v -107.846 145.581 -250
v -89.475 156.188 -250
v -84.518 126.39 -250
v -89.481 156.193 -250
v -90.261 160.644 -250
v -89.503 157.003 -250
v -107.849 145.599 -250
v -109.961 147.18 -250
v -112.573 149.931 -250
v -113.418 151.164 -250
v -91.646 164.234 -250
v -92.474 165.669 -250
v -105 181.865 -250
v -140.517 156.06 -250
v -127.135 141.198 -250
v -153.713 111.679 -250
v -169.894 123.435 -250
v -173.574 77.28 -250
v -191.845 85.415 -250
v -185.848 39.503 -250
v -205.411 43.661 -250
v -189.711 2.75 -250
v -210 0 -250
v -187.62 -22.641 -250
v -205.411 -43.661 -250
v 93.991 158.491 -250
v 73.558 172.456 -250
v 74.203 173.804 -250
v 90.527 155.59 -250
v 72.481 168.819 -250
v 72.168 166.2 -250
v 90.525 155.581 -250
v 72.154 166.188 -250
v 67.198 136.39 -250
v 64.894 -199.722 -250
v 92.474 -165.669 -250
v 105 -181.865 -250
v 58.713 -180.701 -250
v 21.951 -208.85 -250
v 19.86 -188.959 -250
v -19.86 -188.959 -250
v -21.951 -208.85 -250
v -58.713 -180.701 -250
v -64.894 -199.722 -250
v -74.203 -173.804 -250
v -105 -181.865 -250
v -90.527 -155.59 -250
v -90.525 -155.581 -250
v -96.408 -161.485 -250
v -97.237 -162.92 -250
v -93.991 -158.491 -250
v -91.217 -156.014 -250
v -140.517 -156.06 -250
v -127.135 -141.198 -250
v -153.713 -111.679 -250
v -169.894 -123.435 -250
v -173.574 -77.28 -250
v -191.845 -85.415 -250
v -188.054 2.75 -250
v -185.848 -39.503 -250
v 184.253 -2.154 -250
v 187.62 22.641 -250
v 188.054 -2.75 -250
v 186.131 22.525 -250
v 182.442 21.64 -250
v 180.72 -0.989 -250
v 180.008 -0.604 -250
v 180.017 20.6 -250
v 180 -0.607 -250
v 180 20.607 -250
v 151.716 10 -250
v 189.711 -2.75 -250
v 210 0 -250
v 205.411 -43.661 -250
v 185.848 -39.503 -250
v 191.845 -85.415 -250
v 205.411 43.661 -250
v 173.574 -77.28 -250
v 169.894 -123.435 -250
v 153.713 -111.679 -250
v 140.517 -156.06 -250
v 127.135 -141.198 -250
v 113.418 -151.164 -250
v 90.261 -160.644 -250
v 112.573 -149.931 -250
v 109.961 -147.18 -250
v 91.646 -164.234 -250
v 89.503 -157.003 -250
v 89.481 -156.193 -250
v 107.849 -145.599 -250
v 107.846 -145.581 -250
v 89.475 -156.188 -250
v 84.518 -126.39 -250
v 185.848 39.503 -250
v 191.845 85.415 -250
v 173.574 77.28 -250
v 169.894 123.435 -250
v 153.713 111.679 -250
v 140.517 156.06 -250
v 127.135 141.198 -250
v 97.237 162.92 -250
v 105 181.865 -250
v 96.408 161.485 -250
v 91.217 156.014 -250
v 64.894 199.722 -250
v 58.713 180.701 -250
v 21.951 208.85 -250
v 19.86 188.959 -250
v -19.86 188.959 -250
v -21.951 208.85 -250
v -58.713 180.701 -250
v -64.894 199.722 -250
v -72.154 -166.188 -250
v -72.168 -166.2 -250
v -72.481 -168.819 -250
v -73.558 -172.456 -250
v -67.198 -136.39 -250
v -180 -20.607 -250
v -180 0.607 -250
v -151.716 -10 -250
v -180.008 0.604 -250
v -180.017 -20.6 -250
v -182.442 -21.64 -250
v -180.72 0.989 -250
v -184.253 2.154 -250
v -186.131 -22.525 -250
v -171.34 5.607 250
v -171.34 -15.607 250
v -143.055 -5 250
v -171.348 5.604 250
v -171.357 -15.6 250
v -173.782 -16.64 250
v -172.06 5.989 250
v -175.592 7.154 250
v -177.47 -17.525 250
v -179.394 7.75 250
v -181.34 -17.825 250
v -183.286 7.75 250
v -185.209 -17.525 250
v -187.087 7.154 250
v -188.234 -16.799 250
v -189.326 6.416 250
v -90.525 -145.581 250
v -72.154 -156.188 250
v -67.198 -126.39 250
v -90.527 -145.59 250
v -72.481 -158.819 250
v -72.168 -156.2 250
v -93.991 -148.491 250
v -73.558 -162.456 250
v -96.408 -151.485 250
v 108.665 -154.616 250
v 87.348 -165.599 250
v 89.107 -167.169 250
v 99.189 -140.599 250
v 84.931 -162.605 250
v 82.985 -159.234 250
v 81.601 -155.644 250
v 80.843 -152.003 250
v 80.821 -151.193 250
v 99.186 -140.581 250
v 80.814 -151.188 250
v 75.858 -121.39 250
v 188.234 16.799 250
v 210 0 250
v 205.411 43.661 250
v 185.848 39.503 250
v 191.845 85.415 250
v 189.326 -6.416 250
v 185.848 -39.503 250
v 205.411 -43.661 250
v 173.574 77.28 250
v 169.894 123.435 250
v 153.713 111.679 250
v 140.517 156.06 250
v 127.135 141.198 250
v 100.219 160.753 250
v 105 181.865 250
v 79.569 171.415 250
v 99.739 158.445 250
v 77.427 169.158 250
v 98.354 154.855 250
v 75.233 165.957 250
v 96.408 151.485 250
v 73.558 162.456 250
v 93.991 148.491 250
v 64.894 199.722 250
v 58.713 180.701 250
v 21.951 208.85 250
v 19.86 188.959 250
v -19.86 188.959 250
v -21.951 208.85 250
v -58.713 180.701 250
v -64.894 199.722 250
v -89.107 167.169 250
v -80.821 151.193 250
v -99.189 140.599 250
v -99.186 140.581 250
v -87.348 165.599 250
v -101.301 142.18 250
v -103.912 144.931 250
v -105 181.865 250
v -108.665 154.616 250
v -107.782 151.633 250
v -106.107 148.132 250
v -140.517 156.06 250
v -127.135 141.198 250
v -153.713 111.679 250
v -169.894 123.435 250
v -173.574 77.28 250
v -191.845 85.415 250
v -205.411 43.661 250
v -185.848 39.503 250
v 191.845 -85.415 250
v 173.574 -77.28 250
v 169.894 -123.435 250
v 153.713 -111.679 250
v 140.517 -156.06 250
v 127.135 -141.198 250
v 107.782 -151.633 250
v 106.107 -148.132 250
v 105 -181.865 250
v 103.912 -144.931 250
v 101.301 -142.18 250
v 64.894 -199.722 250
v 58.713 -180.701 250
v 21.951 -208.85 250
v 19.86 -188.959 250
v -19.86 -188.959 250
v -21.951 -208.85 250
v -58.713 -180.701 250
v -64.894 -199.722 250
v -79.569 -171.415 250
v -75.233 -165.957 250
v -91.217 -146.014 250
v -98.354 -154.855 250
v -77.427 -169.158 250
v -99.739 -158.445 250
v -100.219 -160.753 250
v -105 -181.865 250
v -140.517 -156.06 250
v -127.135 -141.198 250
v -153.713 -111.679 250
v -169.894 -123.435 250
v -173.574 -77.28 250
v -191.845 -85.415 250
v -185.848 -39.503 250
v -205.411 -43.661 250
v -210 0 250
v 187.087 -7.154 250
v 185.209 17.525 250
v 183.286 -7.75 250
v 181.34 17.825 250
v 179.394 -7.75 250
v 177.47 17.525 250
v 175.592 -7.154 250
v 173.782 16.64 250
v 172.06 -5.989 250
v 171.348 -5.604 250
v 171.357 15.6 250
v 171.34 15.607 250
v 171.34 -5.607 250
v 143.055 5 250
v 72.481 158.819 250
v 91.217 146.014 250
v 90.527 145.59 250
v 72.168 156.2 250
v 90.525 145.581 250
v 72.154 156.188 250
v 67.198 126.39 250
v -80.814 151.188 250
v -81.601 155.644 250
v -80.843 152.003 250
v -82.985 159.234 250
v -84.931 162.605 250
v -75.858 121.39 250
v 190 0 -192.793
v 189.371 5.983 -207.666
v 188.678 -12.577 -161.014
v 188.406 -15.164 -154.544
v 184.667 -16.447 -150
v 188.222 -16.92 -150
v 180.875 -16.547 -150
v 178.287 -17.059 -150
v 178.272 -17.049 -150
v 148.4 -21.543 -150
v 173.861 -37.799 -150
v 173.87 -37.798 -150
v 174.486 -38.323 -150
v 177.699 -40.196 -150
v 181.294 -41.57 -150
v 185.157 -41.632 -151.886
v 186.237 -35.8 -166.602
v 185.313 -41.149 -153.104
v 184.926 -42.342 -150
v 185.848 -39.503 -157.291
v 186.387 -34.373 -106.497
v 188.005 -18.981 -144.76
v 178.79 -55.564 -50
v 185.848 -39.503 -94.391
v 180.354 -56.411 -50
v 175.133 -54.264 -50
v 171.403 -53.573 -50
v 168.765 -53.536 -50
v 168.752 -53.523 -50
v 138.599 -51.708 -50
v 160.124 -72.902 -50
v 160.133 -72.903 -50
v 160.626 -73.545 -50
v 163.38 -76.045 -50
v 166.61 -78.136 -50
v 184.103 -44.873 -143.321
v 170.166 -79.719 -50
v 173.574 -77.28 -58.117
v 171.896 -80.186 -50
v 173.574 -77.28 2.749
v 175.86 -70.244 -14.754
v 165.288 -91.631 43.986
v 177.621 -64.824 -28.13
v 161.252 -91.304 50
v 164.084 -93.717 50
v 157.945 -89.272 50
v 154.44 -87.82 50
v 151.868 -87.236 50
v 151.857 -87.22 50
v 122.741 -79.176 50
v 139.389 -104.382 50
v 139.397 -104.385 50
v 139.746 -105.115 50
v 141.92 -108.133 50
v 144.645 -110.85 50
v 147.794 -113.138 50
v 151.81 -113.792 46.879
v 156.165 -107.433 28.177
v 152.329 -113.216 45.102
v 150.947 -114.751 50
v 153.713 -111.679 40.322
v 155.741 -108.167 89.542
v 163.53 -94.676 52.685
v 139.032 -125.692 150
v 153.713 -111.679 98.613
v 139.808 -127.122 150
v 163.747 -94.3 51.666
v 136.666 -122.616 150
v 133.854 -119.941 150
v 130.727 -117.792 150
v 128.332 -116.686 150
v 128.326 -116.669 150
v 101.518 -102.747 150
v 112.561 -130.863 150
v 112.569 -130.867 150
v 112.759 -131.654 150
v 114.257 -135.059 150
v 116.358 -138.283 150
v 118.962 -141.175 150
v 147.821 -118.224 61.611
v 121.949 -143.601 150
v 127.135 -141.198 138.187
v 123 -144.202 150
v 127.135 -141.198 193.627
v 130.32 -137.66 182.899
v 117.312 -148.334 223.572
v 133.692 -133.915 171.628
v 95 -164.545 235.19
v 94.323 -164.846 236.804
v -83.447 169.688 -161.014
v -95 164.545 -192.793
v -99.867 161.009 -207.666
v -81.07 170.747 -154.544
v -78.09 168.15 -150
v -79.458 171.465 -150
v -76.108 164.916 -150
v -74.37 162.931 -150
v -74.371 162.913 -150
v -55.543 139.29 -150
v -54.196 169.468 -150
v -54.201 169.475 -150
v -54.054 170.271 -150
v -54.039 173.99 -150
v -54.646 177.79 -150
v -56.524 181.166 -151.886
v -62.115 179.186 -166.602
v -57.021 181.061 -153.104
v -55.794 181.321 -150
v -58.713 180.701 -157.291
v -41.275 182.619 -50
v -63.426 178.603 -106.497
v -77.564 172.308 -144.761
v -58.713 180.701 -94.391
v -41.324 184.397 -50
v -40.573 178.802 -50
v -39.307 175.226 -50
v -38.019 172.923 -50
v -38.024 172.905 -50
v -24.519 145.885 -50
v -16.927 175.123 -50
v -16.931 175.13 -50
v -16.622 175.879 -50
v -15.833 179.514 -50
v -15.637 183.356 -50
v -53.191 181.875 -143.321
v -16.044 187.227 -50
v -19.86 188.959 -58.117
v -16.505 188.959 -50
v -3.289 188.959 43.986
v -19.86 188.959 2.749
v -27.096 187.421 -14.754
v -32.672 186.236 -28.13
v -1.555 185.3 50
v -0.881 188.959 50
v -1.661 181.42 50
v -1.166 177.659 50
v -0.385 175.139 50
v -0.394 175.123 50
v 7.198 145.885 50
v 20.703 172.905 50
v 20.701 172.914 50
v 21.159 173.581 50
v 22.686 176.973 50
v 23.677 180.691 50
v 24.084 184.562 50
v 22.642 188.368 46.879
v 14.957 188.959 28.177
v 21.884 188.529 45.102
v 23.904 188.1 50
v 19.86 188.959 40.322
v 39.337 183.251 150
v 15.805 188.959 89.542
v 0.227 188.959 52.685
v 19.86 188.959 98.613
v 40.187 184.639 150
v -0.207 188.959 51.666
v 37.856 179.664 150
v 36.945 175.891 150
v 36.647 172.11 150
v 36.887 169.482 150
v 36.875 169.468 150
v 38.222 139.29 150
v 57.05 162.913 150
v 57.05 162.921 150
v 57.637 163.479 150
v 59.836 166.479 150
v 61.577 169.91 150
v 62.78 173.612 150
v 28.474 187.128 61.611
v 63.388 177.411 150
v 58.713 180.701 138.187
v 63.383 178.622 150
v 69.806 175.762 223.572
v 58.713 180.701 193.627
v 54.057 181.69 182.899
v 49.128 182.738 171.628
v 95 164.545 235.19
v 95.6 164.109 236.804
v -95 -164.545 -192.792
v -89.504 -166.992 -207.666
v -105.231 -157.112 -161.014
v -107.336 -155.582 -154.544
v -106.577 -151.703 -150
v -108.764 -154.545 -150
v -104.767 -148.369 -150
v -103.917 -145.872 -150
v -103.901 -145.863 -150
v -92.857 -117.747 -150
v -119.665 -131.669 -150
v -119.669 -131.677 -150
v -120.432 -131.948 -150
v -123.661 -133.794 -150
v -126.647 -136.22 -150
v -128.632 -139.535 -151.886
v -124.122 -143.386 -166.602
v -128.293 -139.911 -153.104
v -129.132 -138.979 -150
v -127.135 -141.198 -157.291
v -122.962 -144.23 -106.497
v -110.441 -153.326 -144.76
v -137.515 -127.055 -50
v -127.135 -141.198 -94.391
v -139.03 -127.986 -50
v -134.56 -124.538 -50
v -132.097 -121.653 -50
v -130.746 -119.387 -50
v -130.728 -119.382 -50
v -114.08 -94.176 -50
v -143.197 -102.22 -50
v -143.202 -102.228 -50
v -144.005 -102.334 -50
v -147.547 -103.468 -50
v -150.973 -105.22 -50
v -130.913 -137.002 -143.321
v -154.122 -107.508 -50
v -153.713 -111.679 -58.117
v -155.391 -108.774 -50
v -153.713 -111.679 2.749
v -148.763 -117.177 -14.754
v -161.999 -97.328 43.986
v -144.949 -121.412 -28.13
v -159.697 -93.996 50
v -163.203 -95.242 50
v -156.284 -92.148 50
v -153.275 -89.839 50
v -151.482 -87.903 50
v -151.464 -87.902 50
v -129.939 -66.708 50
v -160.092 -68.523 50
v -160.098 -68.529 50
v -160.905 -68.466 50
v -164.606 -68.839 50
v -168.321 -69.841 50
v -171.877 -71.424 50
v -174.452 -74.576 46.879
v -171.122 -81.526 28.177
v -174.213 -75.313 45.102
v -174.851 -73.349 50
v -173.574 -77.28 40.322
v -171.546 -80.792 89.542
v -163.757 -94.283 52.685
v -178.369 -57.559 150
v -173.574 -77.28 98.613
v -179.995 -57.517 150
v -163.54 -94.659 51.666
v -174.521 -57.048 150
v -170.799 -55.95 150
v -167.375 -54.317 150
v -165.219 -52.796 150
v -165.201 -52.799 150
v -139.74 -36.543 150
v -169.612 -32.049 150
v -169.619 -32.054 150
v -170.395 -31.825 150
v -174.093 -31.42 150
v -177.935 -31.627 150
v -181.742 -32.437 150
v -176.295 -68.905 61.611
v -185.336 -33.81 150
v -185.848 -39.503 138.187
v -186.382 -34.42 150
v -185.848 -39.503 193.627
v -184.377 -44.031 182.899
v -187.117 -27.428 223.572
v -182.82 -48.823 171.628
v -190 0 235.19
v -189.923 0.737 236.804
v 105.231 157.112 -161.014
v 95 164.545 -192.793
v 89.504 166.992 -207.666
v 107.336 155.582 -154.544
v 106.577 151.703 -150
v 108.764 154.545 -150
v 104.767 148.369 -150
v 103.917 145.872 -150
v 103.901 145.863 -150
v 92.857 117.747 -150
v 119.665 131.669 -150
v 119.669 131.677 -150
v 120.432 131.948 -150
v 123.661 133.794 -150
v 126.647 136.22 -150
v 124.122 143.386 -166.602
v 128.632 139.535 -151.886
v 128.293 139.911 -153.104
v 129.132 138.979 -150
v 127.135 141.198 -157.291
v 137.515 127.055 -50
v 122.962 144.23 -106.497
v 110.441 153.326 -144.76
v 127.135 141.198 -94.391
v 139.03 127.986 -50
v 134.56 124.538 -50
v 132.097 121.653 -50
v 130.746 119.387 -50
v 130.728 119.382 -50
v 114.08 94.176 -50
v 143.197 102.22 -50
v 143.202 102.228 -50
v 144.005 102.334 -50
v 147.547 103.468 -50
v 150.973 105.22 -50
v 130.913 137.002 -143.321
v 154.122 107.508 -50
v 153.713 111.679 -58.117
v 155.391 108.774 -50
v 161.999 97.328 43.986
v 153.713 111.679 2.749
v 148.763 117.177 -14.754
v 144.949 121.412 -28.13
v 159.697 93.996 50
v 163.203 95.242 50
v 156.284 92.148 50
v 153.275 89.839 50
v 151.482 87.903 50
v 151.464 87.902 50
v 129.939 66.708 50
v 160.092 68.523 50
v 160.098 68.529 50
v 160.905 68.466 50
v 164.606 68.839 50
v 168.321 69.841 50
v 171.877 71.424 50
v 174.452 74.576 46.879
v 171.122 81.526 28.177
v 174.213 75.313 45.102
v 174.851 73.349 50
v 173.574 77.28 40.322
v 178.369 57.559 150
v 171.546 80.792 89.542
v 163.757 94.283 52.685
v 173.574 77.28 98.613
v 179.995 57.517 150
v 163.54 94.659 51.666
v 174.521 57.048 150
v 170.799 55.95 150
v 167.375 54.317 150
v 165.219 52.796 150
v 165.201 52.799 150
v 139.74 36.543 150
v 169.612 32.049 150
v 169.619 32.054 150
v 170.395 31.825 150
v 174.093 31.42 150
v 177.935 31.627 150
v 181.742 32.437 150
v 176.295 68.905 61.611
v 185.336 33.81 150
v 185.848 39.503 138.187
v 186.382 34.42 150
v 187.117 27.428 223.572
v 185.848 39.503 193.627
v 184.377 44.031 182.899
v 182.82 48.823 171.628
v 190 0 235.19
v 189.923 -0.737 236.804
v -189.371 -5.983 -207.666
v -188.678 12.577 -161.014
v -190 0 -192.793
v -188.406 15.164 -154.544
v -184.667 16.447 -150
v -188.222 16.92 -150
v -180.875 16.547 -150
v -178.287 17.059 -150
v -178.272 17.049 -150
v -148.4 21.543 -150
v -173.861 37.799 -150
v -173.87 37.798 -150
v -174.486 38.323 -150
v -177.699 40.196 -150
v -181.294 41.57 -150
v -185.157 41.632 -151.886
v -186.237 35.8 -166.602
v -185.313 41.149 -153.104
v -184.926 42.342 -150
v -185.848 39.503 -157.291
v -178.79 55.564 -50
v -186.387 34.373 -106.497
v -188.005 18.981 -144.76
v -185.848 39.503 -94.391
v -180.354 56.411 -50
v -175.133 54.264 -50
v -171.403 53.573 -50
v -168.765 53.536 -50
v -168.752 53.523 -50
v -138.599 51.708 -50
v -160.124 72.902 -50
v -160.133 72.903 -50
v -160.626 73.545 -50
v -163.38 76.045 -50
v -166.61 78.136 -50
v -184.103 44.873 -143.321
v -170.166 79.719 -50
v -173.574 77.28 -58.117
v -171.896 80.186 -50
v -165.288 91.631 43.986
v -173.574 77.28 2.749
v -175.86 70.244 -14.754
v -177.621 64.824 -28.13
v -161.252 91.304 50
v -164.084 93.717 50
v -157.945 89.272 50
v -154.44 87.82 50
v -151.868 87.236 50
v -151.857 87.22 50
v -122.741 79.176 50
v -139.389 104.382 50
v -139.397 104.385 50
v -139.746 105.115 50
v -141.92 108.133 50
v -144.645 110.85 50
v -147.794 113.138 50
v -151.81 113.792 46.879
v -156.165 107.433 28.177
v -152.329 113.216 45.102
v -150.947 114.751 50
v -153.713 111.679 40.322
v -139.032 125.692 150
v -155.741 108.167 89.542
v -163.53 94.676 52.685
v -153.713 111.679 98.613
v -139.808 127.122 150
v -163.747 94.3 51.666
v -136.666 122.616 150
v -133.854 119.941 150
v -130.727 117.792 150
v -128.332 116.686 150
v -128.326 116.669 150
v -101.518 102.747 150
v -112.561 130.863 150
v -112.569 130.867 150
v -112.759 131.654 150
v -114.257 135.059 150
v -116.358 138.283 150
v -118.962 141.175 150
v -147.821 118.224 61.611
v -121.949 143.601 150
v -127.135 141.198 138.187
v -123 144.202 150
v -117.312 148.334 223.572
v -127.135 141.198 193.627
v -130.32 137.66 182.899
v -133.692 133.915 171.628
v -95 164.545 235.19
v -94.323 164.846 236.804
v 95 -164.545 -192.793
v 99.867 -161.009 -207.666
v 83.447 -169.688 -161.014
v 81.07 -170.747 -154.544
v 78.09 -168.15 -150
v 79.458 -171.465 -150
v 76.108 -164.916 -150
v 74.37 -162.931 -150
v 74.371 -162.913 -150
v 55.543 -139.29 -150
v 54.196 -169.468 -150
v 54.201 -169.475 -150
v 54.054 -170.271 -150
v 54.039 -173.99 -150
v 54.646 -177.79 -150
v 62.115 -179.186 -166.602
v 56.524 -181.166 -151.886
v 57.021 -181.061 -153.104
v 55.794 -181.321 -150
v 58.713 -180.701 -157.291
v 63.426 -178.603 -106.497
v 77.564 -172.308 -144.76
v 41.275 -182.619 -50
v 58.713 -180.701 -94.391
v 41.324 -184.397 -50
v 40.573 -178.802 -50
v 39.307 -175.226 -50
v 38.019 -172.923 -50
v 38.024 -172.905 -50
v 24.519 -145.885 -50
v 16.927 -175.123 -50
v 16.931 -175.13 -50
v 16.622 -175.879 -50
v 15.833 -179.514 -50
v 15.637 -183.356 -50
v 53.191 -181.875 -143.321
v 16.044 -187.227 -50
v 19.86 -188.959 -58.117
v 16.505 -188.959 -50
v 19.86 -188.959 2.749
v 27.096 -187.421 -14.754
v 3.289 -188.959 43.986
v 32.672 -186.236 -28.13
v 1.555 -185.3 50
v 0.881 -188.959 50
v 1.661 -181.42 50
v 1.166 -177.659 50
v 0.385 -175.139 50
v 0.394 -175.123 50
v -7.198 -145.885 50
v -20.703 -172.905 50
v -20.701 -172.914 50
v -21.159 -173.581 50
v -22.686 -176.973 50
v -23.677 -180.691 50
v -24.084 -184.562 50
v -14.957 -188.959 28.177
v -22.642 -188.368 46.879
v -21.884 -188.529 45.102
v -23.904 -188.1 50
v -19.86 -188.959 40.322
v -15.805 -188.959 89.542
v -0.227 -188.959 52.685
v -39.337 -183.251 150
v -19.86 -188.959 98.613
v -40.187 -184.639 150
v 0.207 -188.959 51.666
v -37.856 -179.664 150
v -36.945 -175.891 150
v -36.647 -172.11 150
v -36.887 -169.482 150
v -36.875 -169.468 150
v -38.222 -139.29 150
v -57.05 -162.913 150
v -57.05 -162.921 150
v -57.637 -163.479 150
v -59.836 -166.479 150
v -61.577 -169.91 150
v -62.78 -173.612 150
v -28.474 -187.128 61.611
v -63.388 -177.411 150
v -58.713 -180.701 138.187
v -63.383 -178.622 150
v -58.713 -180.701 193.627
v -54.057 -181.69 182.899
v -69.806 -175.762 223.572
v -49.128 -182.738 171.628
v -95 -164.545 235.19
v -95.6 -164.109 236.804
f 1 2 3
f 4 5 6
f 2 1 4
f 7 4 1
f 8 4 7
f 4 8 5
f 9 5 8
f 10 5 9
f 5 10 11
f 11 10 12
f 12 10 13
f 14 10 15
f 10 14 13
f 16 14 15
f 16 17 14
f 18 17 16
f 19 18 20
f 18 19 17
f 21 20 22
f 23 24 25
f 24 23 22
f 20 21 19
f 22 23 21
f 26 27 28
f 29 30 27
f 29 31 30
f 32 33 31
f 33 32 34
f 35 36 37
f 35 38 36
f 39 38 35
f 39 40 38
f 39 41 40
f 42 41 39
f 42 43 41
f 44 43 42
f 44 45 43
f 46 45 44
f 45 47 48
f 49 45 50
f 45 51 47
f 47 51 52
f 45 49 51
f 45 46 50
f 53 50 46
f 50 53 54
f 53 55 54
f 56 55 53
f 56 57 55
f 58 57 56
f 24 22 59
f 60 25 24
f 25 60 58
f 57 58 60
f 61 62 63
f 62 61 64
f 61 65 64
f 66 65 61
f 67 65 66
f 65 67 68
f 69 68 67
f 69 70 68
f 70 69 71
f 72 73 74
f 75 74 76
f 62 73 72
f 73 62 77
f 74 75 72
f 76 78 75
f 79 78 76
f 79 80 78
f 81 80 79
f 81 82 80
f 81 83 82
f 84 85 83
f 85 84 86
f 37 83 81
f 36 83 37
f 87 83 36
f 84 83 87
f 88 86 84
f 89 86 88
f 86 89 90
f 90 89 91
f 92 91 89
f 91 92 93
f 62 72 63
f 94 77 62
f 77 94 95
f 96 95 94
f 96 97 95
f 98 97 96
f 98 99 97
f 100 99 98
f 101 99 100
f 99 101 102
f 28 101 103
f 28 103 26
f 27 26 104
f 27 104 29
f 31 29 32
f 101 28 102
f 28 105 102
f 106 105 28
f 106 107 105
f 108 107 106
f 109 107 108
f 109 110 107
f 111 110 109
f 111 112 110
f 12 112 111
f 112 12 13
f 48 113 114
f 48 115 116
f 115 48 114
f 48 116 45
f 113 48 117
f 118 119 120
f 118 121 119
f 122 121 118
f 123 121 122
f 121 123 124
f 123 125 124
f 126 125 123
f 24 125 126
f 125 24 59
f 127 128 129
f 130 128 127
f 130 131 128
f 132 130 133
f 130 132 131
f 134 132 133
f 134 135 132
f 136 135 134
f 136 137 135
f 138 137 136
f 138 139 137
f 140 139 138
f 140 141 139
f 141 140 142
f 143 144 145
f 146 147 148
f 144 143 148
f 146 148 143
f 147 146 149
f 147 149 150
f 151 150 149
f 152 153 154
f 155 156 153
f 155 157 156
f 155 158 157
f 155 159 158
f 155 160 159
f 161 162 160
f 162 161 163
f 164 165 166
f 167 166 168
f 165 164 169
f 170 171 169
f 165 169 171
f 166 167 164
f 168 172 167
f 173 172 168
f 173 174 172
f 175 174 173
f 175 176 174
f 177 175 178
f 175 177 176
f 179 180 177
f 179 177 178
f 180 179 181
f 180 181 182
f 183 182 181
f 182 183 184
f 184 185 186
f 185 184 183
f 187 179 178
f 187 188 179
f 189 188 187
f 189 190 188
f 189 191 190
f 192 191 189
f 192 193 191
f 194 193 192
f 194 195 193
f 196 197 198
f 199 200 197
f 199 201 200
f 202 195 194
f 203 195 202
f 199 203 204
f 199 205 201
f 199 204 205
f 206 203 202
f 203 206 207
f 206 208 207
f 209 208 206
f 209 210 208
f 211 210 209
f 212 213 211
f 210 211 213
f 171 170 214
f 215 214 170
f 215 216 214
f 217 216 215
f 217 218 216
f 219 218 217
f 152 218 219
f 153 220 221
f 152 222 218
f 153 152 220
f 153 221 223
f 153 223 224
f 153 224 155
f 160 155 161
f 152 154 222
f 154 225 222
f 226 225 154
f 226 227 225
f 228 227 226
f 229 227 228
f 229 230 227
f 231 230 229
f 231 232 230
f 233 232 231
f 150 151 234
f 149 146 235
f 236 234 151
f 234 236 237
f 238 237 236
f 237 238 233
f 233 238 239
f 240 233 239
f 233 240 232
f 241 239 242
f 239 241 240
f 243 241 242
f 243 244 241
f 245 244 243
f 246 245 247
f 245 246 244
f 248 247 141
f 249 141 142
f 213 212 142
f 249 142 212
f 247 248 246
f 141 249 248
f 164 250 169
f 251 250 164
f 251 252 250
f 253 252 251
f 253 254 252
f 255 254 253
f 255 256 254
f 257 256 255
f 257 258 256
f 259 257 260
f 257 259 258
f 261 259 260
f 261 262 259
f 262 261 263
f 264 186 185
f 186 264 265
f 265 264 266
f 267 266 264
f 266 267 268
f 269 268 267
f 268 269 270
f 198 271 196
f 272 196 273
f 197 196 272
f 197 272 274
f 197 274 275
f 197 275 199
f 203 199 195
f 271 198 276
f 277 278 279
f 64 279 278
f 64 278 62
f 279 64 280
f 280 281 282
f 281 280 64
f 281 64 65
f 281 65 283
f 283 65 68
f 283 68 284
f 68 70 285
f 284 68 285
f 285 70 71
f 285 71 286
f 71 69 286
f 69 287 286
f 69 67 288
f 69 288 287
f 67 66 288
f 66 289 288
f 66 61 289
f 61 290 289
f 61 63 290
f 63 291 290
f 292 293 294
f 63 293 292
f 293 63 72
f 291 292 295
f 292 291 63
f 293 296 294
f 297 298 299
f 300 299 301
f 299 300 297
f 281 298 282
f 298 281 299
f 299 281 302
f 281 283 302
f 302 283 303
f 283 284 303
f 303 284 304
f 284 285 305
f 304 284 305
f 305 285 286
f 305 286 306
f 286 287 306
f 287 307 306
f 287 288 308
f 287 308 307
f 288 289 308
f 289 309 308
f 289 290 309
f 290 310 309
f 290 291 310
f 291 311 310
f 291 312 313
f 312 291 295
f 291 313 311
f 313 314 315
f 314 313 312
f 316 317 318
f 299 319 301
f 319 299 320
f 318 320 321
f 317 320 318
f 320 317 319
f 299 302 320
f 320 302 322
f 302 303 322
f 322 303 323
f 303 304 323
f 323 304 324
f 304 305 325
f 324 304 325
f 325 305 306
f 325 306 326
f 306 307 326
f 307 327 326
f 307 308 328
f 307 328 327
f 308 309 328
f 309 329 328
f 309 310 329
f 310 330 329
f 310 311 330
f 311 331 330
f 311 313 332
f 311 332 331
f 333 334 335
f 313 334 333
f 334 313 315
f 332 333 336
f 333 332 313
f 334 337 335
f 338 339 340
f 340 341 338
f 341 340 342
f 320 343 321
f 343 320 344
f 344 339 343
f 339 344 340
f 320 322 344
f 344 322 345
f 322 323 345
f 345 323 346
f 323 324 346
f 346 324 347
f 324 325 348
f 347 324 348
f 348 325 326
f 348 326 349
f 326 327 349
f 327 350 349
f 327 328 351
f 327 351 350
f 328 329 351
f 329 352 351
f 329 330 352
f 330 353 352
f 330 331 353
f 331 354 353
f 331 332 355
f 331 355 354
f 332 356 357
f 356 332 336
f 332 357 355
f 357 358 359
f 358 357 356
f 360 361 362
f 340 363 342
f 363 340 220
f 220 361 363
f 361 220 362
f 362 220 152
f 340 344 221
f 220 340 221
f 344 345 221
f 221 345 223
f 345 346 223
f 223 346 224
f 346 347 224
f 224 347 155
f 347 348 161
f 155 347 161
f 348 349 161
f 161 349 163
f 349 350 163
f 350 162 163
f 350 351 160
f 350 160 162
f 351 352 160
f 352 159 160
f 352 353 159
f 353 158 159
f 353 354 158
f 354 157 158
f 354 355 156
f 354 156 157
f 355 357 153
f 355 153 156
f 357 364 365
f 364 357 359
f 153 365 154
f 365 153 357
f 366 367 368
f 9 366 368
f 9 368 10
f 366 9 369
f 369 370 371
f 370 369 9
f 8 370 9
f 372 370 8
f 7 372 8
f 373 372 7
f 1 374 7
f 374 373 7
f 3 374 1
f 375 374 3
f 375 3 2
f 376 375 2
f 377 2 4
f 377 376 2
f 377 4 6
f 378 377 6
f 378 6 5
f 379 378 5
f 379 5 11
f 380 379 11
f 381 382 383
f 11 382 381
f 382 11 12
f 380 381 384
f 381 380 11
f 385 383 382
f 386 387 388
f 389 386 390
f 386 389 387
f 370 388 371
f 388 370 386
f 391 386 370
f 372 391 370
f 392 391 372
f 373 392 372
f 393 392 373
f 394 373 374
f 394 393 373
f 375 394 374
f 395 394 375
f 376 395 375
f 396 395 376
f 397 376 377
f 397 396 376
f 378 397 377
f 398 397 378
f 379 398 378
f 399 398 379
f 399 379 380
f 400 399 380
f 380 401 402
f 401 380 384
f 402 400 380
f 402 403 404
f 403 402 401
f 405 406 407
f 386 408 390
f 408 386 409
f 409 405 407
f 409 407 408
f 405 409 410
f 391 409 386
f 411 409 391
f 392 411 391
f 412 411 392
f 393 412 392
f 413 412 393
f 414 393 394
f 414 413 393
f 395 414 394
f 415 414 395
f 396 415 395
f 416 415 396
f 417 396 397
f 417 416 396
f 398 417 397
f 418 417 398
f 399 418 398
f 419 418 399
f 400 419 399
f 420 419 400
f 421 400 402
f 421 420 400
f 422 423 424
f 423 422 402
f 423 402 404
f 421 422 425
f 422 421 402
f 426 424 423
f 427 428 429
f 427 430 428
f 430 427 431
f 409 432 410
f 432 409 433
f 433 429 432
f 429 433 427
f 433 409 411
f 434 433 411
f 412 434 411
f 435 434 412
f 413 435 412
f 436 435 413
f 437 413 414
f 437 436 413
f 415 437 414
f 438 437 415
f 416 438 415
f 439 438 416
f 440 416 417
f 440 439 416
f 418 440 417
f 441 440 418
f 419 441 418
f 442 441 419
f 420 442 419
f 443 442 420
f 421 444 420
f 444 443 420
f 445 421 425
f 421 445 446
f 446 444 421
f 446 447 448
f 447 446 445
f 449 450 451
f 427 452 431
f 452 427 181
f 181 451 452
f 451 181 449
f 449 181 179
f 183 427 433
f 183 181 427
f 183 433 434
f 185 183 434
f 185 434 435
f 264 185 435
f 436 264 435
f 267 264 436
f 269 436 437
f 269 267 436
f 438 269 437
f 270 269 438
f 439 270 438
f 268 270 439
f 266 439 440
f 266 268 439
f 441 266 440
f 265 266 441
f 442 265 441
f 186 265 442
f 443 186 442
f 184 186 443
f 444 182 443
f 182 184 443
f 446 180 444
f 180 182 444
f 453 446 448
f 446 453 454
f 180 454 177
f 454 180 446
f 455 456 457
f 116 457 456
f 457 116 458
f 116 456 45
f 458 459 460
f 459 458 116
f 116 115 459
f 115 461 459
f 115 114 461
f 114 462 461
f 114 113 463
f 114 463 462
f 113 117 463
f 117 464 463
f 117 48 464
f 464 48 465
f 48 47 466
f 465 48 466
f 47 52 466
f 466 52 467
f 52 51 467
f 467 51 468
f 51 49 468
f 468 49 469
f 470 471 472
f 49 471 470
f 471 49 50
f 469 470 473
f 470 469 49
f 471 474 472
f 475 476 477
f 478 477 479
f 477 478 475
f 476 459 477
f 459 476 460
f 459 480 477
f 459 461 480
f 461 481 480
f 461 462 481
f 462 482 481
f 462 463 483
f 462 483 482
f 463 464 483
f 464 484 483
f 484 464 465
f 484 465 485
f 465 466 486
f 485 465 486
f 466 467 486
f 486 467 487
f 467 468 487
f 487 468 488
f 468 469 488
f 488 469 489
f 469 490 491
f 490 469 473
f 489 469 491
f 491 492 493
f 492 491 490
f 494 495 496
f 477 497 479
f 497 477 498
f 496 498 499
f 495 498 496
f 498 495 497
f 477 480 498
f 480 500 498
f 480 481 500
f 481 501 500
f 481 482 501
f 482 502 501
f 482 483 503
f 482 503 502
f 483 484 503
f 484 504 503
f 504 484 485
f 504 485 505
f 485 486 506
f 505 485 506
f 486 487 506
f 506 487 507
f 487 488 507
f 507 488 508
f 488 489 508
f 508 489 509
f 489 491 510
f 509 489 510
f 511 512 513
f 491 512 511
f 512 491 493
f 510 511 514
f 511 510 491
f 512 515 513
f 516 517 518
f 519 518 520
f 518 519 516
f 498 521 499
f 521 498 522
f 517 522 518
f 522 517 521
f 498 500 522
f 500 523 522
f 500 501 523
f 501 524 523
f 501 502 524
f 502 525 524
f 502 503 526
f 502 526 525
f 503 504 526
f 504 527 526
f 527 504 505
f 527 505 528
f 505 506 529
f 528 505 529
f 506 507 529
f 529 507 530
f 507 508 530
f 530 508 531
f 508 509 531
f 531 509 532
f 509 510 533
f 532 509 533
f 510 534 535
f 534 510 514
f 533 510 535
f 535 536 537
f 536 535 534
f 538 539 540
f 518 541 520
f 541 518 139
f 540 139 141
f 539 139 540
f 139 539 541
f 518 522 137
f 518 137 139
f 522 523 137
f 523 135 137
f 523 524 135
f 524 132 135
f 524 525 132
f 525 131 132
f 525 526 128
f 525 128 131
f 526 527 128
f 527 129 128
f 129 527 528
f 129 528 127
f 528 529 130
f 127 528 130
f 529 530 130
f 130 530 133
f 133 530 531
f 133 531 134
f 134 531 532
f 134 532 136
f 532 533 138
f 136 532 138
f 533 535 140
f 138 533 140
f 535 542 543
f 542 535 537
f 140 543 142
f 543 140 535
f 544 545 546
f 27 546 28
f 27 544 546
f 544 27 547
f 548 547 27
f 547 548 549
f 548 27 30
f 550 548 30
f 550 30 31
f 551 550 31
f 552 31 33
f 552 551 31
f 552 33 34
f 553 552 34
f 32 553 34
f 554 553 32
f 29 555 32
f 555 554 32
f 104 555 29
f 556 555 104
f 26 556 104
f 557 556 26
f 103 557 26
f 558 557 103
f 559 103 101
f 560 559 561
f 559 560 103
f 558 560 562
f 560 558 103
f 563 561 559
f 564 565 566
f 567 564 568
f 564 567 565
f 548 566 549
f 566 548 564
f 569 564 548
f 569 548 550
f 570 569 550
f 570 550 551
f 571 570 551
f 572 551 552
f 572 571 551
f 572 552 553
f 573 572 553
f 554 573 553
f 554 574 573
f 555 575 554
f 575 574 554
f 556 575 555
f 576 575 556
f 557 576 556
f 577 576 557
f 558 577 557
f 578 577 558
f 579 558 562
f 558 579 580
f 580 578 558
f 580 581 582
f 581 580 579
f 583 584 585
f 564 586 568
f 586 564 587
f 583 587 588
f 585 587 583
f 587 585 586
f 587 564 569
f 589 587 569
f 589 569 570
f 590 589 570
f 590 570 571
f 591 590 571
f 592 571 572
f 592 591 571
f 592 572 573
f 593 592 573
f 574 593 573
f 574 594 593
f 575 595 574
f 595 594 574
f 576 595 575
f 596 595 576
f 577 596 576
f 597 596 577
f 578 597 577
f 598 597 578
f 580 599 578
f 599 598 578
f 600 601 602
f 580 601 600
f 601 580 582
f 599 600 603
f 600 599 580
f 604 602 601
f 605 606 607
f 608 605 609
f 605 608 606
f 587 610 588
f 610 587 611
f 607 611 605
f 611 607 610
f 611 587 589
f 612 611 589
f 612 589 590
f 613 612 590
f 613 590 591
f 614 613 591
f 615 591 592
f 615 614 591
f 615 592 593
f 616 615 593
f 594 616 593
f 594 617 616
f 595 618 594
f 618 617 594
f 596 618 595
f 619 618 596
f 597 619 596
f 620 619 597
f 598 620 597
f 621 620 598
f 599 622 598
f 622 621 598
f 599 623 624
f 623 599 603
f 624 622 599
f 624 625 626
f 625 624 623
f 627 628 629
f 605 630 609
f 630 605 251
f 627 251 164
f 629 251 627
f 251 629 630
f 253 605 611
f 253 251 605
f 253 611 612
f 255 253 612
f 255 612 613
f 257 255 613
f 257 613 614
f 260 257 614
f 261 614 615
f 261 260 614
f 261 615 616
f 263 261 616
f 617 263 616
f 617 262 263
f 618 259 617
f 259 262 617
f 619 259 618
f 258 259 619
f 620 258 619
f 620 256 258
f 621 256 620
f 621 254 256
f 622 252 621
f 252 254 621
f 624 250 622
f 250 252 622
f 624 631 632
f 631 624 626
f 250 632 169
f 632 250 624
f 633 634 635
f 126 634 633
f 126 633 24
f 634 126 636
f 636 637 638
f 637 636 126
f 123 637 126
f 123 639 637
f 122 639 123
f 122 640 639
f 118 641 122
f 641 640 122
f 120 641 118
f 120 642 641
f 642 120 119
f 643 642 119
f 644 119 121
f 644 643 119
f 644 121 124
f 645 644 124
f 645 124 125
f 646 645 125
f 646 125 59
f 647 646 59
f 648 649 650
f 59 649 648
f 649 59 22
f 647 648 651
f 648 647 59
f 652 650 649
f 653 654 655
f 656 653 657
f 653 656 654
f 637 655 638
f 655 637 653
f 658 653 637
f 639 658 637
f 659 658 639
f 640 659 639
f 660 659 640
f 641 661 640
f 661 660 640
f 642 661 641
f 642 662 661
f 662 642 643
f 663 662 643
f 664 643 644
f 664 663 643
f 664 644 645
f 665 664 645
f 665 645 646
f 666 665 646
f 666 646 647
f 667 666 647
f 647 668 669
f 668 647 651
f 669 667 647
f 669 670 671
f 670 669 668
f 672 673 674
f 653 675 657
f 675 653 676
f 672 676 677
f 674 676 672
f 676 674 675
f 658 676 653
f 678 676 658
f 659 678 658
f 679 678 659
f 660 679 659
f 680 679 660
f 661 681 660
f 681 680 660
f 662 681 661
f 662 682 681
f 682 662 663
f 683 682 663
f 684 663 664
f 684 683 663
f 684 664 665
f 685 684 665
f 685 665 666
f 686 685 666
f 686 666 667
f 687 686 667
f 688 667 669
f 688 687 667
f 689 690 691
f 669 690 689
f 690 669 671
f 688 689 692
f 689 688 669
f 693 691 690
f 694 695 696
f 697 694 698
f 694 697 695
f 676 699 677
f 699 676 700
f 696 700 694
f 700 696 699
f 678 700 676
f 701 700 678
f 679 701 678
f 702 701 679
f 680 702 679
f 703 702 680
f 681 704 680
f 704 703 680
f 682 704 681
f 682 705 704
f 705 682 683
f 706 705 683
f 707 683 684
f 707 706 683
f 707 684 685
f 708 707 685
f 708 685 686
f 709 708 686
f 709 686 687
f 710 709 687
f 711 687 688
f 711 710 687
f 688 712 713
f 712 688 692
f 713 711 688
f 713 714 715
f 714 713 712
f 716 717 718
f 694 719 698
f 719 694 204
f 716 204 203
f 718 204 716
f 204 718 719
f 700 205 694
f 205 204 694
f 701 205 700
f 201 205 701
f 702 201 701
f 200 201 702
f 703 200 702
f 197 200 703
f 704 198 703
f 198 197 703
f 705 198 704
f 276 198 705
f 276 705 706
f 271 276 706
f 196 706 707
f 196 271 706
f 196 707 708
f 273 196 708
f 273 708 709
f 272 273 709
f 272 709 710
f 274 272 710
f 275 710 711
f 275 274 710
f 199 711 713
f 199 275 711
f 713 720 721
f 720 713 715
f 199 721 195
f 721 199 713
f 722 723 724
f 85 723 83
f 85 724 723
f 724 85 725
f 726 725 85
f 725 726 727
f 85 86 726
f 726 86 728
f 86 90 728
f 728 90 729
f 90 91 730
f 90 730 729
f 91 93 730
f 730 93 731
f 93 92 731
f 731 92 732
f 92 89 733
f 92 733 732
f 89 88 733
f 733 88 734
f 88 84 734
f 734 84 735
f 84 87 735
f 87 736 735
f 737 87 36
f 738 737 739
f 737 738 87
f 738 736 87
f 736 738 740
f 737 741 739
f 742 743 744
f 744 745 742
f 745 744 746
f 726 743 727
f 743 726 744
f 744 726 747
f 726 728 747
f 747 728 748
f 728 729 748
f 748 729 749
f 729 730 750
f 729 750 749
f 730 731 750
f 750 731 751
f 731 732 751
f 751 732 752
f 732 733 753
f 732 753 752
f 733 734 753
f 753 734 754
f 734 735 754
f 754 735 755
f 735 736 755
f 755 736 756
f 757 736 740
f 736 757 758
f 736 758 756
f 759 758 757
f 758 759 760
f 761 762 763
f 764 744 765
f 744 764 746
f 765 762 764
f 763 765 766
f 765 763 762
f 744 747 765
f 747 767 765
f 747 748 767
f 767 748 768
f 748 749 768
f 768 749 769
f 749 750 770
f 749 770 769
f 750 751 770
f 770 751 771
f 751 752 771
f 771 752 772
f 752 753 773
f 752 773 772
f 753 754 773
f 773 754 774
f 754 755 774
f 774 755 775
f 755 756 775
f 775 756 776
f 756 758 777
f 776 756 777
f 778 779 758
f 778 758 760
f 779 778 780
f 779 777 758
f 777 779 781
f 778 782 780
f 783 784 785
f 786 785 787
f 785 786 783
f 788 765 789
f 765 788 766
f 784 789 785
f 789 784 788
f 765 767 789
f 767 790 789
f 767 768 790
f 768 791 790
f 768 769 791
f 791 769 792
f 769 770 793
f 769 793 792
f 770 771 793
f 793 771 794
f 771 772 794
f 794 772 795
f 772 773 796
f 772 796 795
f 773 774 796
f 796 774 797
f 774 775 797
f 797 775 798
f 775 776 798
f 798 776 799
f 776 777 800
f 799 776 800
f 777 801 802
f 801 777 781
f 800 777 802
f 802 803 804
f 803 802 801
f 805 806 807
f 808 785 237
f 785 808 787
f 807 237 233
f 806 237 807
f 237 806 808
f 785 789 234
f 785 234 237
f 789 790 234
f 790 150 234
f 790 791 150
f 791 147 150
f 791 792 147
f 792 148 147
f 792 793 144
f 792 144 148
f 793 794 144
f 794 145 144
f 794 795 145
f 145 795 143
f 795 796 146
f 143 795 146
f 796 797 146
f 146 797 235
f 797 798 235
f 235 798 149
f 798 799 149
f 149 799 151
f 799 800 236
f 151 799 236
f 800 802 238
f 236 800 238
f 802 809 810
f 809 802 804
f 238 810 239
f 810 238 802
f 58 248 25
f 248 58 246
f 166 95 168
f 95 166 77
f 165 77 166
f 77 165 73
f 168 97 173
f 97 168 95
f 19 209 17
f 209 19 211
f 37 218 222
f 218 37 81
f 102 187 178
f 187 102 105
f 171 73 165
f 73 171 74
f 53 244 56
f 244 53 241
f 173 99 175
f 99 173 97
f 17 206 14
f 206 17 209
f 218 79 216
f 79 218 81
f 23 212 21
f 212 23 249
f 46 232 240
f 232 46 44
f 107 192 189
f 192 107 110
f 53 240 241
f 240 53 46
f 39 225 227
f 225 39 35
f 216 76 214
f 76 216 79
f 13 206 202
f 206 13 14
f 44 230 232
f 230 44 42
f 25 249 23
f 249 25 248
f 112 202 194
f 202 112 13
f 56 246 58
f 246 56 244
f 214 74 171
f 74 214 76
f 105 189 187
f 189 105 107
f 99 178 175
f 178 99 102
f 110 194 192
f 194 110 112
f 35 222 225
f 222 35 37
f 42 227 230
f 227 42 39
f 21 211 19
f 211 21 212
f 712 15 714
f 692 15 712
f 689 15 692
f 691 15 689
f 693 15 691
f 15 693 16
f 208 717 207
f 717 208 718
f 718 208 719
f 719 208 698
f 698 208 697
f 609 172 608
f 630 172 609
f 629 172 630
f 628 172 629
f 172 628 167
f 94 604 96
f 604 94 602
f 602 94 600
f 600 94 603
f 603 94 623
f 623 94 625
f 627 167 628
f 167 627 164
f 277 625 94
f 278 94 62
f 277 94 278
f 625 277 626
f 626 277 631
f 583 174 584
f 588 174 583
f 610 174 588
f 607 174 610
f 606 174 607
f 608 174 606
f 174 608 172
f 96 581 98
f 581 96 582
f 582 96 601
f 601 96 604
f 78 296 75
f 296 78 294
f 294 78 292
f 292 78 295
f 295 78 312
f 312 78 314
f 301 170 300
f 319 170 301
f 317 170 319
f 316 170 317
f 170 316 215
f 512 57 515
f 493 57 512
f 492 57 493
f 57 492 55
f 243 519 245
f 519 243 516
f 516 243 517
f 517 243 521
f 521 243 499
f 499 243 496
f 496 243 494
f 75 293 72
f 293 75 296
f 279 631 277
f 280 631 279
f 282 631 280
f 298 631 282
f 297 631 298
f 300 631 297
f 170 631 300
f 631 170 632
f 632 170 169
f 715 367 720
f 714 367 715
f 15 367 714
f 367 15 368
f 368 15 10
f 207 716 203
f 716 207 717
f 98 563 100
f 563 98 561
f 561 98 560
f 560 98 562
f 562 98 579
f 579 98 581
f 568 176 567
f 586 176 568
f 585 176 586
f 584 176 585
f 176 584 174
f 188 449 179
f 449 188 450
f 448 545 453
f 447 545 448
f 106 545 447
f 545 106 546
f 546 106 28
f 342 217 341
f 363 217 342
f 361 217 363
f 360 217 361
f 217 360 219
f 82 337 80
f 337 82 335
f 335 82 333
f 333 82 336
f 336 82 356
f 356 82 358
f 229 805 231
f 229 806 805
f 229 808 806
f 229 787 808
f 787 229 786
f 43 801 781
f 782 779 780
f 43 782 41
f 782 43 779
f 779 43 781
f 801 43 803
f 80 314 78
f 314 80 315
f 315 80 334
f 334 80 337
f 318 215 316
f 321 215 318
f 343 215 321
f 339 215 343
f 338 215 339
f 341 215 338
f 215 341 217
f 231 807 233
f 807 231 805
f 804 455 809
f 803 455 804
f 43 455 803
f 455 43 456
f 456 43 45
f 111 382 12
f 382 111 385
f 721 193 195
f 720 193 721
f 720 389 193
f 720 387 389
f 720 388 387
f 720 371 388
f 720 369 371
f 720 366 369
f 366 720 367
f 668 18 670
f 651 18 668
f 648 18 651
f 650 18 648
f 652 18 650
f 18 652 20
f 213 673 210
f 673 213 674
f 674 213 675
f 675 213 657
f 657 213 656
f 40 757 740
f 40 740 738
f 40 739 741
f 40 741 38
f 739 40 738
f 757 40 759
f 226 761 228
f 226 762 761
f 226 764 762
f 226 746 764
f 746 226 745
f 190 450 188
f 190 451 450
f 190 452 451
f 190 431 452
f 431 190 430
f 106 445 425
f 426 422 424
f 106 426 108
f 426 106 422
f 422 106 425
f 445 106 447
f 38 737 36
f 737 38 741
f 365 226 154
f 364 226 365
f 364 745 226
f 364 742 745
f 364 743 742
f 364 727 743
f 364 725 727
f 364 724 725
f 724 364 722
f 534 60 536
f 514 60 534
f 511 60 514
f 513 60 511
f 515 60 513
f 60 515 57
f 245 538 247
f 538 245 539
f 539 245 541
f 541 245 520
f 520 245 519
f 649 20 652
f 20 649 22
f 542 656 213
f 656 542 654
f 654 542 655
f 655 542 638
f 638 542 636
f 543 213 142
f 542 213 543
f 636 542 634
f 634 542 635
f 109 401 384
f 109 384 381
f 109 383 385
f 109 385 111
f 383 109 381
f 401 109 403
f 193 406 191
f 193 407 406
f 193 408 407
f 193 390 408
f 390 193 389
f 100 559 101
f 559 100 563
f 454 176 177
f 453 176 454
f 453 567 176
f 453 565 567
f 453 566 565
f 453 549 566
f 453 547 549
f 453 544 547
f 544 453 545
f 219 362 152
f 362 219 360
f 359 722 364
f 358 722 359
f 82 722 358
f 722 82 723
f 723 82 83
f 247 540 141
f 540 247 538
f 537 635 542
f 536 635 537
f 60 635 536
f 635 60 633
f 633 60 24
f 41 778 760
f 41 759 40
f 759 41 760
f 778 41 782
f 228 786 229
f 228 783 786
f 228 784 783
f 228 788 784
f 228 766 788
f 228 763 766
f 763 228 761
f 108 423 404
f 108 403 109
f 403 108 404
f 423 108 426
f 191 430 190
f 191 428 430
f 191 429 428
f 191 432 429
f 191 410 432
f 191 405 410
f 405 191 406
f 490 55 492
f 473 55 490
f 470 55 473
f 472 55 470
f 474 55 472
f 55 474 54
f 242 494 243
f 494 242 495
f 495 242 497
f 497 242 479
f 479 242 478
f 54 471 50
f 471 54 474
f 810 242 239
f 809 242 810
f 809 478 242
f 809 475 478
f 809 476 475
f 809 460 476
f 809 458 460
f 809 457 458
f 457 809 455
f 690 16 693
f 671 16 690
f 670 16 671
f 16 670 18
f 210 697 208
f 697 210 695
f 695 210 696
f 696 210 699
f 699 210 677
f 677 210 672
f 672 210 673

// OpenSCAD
vawt();
rotate(60) vawt();

difference(){
	cylinder(h=500,r=210,center=true);
	cylinder(h=500,r=190,center=true);
}






module raindrop(){
union(){
translate([0,5,0,]){
scale(v=[1,2,1]){
rotate(45){
square(size=10,center=true);
}}}
scale(v=[0.95,1,1]){
circle(r=9);}}}


module foil(){

rotate(90) scale(v=[0.5,1,1]){
raindrop();}}

module blade()
{
linear_extrude(height = 500, center = true, convexity = 10, twist = 60)
translate([190, 0, 0]){
scale([2,3,1]){
foil();}}}


module vawt()
for ( i = [0:2] ) {
 rotate( i*360/3, [0, 0, 1])
  translate( [0, 10, 0] ) blade();
}
